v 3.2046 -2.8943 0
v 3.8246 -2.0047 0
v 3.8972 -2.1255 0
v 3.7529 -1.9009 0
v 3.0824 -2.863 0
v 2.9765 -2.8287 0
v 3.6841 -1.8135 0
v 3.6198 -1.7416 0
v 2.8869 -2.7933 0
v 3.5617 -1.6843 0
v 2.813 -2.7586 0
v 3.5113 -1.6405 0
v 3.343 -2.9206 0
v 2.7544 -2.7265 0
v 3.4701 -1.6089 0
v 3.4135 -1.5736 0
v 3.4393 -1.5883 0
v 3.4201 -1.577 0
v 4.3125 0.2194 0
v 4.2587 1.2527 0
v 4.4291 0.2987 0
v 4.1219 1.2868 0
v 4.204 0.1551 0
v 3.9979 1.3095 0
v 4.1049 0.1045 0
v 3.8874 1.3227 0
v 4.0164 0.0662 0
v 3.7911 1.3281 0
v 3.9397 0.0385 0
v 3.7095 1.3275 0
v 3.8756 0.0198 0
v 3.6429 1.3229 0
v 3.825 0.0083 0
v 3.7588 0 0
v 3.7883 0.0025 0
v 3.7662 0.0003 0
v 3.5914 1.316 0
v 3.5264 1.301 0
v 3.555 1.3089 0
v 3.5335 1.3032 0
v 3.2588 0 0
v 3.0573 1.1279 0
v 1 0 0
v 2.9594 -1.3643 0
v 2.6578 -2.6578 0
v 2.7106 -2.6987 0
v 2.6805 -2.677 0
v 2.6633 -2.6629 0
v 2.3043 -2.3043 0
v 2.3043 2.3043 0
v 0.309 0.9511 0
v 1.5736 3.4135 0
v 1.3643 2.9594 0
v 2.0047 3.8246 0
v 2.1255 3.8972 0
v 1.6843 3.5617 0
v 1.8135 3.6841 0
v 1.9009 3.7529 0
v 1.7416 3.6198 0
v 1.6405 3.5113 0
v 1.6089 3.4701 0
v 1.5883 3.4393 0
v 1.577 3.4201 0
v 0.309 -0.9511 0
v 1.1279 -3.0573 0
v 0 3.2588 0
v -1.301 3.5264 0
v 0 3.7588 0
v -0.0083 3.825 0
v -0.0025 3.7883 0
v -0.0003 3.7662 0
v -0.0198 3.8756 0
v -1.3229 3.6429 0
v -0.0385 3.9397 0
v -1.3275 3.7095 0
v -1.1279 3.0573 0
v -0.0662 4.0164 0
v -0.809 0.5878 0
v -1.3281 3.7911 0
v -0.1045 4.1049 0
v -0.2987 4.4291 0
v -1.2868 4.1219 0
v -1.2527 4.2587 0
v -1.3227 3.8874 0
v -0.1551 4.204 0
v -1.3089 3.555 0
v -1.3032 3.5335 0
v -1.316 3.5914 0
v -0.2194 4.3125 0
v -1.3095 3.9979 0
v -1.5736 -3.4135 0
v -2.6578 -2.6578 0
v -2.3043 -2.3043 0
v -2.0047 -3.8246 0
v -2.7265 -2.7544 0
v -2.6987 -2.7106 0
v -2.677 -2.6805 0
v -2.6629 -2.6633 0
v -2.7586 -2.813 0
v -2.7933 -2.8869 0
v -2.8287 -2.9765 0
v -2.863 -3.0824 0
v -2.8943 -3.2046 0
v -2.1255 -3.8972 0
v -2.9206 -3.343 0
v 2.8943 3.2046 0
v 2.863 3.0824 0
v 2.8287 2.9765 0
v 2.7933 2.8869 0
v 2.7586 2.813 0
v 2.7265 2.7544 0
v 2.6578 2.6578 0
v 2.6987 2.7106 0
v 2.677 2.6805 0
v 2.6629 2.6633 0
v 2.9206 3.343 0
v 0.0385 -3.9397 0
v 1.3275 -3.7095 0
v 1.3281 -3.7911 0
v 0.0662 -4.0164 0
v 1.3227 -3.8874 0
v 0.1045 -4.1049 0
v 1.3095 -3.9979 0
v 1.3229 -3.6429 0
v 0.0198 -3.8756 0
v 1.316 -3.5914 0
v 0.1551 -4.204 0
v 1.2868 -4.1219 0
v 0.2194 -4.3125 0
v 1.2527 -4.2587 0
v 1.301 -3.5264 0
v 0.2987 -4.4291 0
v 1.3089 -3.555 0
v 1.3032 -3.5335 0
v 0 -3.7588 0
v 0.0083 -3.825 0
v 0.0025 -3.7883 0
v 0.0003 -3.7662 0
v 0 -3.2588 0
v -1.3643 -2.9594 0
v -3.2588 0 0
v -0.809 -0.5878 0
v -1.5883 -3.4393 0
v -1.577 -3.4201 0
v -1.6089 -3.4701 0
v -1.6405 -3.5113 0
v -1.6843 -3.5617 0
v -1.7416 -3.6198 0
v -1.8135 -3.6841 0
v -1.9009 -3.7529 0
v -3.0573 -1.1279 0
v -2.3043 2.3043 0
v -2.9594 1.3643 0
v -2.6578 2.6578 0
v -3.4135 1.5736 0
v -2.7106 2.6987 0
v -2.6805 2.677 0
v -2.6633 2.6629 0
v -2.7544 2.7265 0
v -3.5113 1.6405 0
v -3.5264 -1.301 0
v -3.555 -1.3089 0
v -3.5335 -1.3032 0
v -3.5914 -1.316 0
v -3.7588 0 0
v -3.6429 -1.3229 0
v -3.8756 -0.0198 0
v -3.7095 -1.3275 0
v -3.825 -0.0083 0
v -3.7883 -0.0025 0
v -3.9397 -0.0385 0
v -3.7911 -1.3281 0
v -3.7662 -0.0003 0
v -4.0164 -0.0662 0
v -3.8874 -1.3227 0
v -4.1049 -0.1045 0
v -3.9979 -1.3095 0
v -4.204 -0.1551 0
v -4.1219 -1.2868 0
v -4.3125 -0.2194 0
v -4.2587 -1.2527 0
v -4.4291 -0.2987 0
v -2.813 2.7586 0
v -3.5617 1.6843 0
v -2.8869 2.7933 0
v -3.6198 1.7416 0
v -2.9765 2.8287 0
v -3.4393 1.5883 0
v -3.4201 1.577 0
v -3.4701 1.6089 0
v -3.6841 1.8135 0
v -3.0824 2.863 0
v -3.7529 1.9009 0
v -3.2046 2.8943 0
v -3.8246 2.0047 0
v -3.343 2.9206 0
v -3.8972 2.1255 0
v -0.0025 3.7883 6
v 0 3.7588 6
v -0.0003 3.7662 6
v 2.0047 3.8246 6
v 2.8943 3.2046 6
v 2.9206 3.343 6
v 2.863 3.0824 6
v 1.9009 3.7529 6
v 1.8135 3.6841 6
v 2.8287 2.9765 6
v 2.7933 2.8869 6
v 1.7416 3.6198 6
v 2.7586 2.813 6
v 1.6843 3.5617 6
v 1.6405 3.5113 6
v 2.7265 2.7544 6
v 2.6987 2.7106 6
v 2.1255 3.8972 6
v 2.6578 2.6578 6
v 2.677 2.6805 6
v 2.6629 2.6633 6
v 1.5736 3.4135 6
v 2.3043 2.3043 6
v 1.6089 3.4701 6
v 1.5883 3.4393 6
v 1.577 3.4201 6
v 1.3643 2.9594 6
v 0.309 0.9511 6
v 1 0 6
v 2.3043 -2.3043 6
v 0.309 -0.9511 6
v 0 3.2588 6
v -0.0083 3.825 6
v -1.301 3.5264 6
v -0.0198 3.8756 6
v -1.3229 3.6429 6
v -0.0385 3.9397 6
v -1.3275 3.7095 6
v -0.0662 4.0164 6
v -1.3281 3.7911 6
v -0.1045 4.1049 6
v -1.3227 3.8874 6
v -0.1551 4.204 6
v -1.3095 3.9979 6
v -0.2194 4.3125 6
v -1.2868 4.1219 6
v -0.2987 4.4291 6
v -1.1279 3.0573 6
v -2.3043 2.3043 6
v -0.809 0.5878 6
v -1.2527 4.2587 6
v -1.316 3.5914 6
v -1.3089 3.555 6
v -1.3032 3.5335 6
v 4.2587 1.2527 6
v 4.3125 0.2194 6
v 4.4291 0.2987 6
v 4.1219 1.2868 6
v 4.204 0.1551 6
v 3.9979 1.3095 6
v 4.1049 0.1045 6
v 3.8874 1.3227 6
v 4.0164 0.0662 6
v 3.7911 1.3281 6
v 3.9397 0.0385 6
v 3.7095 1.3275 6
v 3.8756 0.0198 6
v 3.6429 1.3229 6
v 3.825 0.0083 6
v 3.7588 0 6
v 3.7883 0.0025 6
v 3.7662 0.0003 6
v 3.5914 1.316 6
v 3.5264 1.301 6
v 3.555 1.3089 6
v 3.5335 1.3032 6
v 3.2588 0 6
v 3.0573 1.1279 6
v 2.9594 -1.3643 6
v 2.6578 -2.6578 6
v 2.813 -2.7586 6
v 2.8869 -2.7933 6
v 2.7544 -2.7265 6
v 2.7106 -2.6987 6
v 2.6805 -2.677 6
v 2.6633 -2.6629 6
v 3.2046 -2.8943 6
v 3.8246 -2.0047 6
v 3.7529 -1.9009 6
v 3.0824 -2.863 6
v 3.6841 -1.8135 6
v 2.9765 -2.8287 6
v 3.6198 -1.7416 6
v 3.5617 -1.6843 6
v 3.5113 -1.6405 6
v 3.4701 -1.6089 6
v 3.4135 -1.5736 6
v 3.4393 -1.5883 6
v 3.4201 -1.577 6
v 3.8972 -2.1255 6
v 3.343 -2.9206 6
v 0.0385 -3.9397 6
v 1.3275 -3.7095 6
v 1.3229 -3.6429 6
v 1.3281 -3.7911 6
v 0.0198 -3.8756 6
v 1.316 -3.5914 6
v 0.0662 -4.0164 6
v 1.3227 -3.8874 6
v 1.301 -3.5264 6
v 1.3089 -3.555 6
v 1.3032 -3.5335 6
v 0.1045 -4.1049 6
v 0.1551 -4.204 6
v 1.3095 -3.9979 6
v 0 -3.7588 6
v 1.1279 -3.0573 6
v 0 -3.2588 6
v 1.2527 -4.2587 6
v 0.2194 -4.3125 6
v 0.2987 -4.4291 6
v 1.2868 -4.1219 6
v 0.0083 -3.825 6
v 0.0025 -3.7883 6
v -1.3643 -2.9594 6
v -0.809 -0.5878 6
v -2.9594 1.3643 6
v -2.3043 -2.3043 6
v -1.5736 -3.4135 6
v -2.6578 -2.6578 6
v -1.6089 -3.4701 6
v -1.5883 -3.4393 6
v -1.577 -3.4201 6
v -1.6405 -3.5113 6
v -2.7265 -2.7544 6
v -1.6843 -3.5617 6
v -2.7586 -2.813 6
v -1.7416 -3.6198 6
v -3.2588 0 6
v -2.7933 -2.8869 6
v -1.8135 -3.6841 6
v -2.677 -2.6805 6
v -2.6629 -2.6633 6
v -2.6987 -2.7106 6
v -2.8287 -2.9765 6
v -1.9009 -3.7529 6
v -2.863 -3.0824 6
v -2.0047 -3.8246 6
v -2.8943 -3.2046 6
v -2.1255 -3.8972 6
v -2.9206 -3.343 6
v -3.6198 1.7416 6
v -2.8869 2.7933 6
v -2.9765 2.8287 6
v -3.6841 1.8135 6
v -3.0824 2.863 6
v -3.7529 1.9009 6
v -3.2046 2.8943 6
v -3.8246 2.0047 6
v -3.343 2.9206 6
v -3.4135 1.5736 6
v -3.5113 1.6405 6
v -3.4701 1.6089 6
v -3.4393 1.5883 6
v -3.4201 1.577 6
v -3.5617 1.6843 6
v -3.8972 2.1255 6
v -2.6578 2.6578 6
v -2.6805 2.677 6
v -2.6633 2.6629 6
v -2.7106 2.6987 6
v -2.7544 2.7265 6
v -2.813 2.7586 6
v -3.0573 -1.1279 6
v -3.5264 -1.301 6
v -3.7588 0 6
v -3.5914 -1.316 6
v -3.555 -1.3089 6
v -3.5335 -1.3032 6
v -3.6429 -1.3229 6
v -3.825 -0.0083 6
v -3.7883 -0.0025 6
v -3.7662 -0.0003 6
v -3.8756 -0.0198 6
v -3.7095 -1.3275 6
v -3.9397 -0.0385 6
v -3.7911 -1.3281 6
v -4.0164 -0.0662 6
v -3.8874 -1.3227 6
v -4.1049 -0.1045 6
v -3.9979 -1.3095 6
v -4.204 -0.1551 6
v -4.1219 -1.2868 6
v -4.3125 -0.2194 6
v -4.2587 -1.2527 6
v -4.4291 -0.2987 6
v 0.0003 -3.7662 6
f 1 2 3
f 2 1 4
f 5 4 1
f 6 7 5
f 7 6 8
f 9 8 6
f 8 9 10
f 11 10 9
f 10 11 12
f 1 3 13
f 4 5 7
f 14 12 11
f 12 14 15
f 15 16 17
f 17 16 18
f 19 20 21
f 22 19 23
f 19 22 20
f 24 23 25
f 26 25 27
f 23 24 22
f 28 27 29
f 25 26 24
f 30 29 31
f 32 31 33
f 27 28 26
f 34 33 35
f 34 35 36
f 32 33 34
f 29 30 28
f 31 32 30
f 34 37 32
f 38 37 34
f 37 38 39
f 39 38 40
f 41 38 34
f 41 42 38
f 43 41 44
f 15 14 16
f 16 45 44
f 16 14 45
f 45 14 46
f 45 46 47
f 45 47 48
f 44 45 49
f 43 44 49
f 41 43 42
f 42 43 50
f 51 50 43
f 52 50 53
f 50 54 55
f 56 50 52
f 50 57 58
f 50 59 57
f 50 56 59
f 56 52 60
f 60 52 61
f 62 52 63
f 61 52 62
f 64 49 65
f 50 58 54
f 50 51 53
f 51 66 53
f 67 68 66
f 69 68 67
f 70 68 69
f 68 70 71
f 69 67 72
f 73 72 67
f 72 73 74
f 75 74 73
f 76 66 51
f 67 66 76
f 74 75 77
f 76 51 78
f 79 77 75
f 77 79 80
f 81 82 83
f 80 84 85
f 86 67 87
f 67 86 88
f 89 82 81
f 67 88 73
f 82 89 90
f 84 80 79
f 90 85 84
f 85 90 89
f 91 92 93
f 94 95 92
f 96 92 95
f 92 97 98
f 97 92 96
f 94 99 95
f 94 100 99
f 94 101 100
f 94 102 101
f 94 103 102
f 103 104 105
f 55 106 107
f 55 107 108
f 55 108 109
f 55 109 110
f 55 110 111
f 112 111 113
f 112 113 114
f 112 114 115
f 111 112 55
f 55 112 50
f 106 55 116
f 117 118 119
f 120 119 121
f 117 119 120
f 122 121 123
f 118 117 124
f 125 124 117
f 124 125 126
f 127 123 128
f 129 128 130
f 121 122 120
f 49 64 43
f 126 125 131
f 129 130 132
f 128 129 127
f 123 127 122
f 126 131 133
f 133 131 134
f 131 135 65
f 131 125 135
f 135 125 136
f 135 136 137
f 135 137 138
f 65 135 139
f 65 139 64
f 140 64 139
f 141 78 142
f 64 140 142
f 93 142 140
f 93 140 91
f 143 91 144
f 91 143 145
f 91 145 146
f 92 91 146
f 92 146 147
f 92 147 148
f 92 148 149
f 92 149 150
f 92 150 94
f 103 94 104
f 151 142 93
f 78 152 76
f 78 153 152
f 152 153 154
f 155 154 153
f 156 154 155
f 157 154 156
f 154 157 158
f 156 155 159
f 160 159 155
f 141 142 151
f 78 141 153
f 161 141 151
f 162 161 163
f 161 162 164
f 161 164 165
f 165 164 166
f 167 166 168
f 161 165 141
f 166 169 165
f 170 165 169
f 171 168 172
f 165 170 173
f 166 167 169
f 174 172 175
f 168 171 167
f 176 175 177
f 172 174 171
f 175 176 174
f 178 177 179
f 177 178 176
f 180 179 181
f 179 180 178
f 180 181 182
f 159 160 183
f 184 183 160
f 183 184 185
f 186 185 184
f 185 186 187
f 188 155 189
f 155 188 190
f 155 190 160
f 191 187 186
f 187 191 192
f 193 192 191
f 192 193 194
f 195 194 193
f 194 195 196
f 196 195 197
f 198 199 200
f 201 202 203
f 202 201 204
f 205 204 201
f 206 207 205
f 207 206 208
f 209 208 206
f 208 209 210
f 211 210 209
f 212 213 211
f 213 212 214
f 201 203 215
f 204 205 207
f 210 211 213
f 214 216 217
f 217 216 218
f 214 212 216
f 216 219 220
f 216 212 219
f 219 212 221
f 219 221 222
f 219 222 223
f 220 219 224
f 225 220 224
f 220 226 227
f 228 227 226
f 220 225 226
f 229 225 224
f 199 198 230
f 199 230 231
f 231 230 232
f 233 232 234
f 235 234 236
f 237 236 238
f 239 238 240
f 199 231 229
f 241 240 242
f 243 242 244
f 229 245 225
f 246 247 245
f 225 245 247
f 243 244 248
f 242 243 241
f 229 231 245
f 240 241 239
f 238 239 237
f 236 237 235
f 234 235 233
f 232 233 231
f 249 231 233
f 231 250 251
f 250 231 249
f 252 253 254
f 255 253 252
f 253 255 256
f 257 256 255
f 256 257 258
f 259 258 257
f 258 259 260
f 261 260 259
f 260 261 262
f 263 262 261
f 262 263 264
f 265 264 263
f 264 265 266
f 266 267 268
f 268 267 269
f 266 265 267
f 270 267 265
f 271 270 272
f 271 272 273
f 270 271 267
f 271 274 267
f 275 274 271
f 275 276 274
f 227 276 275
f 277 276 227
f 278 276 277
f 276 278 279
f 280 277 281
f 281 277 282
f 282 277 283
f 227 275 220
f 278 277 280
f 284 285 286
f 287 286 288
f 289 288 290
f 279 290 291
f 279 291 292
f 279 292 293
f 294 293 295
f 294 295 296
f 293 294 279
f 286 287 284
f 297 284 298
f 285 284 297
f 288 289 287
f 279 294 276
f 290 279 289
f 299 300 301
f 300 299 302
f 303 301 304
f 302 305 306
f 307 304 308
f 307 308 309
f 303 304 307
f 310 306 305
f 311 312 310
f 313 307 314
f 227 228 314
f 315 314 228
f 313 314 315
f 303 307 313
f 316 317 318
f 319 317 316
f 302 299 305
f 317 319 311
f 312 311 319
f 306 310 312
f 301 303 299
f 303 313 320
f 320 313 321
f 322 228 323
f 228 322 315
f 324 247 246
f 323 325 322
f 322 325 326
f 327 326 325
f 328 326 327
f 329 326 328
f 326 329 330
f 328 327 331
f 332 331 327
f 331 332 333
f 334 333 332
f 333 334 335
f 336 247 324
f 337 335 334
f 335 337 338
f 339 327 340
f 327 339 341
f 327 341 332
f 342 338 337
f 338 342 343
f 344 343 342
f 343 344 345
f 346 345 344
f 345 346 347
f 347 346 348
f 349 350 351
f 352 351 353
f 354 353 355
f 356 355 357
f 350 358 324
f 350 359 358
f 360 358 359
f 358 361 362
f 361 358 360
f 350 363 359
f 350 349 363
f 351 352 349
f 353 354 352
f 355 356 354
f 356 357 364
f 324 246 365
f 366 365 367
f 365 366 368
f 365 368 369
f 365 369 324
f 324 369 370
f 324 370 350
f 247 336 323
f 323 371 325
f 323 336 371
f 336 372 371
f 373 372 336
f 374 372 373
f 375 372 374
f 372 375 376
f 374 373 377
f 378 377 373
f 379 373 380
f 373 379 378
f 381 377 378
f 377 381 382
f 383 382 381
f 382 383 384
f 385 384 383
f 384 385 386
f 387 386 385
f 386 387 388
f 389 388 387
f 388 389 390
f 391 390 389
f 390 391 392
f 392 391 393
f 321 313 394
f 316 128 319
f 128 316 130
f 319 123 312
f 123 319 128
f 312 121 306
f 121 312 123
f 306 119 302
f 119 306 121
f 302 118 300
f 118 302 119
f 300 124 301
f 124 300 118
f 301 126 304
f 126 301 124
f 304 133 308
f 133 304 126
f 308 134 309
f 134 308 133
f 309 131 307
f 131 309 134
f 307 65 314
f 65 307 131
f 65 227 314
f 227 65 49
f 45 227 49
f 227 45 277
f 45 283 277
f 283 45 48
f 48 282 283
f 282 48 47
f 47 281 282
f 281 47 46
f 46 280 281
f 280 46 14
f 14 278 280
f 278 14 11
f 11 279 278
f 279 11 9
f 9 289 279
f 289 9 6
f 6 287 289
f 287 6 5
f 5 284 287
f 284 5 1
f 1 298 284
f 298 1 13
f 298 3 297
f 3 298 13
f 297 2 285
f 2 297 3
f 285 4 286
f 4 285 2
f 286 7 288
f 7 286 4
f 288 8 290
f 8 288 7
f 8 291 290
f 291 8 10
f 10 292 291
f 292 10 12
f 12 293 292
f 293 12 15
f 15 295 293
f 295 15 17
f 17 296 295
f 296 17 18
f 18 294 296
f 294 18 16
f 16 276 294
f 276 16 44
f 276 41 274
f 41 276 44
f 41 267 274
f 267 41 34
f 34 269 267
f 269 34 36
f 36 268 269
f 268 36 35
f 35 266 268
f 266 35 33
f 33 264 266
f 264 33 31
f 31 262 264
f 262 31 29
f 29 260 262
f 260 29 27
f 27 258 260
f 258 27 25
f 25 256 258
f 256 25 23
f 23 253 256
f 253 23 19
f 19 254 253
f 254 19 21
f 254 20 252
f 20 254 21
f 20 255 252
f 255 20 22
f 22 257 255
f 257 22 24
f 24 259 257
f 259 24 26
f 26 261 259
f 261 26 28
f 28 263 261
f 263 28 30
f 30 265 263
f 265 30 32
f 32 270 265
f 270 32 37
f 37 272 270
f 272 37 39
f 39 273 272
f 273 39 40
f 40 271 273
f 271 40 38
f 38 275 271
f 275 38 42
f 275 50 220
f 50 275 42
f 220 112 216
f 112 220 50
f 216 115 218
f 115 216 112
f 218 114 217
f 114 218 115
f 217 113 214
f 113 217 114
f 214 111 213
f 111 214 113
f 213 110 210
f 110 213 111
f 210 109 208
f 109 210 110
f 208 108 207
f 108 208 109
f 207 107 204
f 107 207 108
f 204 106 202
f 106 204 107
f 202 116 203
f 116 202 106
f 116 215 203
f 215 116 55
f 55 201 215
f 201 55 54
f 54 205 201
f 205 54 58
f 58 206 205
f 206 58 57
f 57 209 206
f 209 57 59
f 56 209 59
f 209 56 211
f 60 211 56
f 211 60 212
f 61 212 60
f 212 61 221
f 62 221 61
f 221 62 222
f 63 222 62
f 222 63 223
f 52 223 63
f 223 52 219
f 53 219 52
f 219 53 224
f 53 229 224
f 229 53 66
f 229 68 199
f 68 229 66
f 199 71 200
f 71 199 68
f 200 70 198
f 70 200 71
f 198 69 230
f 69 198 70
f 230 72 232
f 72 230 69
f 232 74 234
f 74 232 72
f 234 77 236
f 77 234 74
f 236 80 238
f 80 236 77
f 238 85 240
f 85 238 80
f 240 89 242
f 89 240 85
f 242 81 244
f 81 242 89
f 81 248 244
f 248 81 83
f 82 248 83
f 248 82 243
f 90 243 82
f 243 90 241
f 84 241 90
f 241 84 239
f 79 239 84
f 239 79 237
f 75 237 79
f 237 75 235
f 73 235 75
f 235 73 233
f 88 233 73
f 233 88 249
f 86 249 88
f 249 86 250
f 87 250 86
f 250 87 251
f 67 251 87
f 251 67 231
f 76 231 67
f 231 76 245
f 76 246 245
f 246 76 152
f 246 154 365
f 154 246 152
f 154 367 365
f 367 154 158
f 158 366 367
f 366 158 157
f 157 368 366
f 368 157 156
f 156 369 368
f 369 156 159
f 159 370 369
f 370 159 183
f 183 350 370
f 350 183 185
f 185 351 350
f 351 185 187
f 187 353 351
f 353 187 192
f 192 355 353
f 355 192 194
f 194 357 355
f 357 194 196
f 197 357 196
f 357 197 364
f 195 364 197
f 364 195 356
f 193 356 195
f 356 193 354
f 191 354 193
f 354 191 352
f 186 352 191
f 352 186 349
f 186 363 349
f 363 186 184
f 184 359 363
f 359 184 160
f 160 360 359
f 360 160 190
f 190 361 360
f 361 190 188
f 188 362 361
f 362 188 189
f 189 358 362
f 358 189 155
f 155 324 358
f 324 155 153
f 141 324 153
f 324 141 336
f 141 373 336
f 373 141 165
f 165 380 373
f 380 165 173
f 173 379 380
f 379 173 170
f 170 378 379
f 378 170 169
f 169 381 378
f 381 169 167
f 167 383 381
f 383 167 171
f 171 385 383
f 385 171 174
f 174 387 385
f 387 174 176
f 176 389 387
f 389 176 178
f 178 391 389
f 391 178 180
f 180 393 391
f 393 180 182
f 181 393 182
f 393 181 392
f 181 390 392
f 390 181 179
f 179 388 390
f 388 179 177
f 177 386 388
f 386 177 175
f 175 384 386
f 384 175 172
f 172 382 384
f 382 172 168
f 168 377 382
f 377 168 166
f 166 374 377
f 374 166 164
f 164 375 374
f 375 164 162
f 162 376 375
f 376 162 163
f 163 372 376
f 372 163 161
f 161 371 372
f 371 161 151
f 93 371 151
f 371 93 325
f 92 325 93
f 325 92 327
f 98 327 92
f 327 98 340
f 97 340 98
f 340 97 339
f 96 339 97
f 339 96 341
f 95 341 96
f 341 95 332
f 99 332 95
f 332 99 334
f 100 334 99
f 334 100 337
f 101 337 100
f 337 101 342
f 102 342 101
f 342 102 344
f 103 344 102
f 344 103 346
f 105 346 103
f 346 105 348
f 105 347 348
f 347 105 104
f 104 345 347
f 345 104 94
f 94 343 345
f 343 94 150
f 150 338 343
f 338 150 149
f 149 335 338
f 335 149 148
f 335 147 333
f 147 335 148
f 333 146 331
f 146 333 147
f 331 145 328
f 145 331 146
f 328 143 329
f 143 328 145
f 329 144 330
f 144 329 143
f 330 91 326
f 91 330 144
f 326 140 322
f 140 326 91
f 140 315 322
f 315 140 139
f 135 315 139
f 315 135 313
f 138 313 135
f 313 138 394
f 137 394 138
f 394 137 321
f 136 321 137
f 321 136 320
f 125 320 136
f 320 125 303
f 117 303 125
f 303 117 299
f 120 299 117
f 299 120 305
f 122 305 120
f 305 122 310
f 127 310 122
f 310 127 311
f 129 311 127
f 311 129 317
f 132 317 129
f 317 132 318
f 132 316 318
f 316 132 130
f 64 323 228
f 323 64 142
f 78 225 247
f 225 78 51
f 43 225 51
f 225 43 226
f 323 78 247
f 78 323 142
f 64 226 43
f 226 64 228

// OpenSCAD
difference(){
       linear_extrude(height = 6.0) { polygon( points= [[3.2587704831436337,0.0],[3.7587704831436337,0.0],[3.7661826775218383,3.106652633452797e-4],[3.788331483760405,2.482379522165296e-3],[3.824954148555375,8.361497512954905e-3],[3.875614671157227,1.9765072451087693e-2],[3.939706674356992,3.8466422304543946e-2],[4.0164574016259635,6.61809552291836e-2],[4.104932818303717,0.10455233842683846],[4.204043788606136,0.1551390928787902],[4.31255329424558,0.21940169416311134],[4.429084654649506,0.2986902568959486],[4.25871064175394,1.252753135070131],[4.121938805066724,1.286807486143582],[3.9978937445738914,1.3095411111355153],[3.8873997523632795,1.3226971685096065],[3.7911118927657146,1.3280740169287988],[3.7095125528420625,1.3275108157469406],[3.6429091345634714,1.3228729246198043],[3.5914328993873603,1.3160371888323426],[3.555038969561142,1.308877197432997],[3.533507484099017,1.3032486013016489],[3.526445901006527,1.300974577855421],[3.057350233045285,1.1279160493166744],[2.304298706961425,2.304298706961425],[2.657852097554699,2.6578520975546986],[2.66287363694861,2.6633129839773906],[2.676999574155876,2.6805101889430794],[2.698738544578838,2.710563487763407],[2.7264973984805394,2.7544494320021538],[2.758593437264202,2.812993173383259],[2.793267262808661,2.886861267264578],[2.828696164647236,2.9765554996282924],[2.8630079667268618,3.0824077759303057],[2.8942952528428814,3.204576104335987],[2.920629887626467,3.3430416998774204],[2.1255329369347287,3.8971934108563215],[2.0047405811649144,3.824561180232396],[1.9009523773249888,3.7529231771779665],[1.8135185887695924,3.684094863388369],[1.7416307843235932,3.6198110708996154],[1.6843295810980967,3.5617133809243904],[1.6405133366495037,3.5113381679429922],[1.6089477368162357,3.470105377850296],[1.5882762207138044,3.4393081048044354],[1.5770311798275527,3.4201030269321104],[1.5736458639363455,3.4135017562420935],[1.3643159951676316,2.9594301693295533],[1.9954214206688624e-16,3.2587704831436337],[2.3015831204557005e-16,3.7587704831436337],[-3.1066526334504906e-4,3.7661826775218383],[-2.482379522165064e-3,3.788331483760405],[-8.36149751295467e-3,3.824954148555375],[-1.9765072451087457e-2,3.875614671157227],[-3.84664223045437e-2,3.939706674356992],[-6.618095522918335e-2,4.0164574016259635],[-0.10455233842683821,4.104932818303717],[-0.15513909287878996,4.204043788606136],[-0.21940169416311106,4.31255329424558],[-0.2986902568959483,4.429084654649506],[-1.2527531350701309,4.25871064175394],[-1.2868074861435819,4.121938805066724],[-1.309541111135515,3.9978937445738914],[-1.3226971685096063,3.8873997523632795],[-1.3280740169287986,3.7911118927657146],[-1.3275108157469404,3.7095125528420625],[-1.322872924619804,3.6429091345634714],[-1.3160371888323423,3.5914328993873603],[-1.3088771974329967,3.555038969561142],[-1.3032486013016487,3.533507484099017],[-1.3009745778554207,3.526445901006527],[-1.1279160493166742,3.057350233045285],[-2.304298706961425,2.304298706961425],[-2.6578520975546986,2.657852097554699],[-2.6633129839773906,2.66287363694861],[-2.6805101889430794,2.676999574155876],[-2.710563487763407,2.698738544578838],[-2.7544494320021538,2.7264973984805394],[-2.812993173383259,2.758593437264202],[-2.886861267264578,2.793267262808661],[-2.9765554996282924,2.828696164647236],[-3.0824077759303057,2.8630079667268618],[-3.204576104335987,2.8942952528428814],[-3.3430416998774204,2.920629887626467],[-3.8971934108563215,2.1255329369347287],[-3.824561180232396,2.0047405811649144],[-3.7529231771779665,1.9009523773249888],[-3.684094863388369,1.8135185887695924],[-3.6198110708996154,1.7416307843235932],[-3.5617133809243904,1.6843295810980967],[-3.5113381679429922,1.6405133366495037],[-3.470105377850296,1.6089477368162357],[-3.4393081048044354,1.5882762207138044],[-3.4201030269321104,1.5770311798275527],[-3.4135017562420935,1.5736458639363455],[-2.9594301693295533,1.3643159951676316],[-3.2587704831436337,3.990842841337725e-16],[-3.7587704831436337,4.603166240911401e-16],[-3.7661826775218383,-3.1066526334481845e-4],[-3.788331483760405,-2.482379522164832e-3],[-3.824954148555375,-8.361497512954437e-3],[-3.875614671157227,-1.9765072451087218e-2],[-3.939706674356992,-3.846642230454346e-2],[-4.0164574016259635,-6.618095522918312e-2],[-4.104932818303717,-0.10455233842683796],[-4.204043788606136,-0.1551390928787897],[-4.31255329424558,-0.2194016941631108],[-4.429084654649506,-0.298690256895948],[-4.25871064175394,-1.2527531350701306],[-4.121938805066724,-1.2868074861435816],[-3.9978937445738914,-1.3095411111355149],[-3.8873997523632795,-1.322697168509606],[-3.7911118927657146,-1.3280740169287983],[-3.7095125528420625,-1.3275108157469402],[-3.6429091345634714,-1.3228729246198039],[-3.5914328993873603,-1.316037188832342],[-3.555038969561142,-1.3088771974329965],[-3.533507484099017,-1.3032486013016484],[-3.526445901006527,-1.3009745778554205],[-3.057350233045285,-1.127916049316674],[-2.3042987069614256,-2.304298706961425],[-2.6578520975546995,-2.6578520975546986],[-2.6628736369486106,-2.6633129839773906],[-2.6769995741558765,-2.6805101889430794],[-2.6987385445788385,-2.710563487763407],[-2.72649739848054,-2.7544494320021538],[-2.7585934372642025,-2.812993173383259],[-2.7932672628086612,-2.886861267264578],[-2.8286961646472366,-2.9765554996282924],[-2.863007966726862,-3.0824077759303057],[-2.894295252842882,-3.204576104335987],[-2.9206298876264674,-3.3430416998774204],[-2.125532936934729,-3.8971934108563215],[-2.0047405811649144,-3.824561180232396],[-1.9009523773249892,-3.7529231771779665],[-1.8135185887695928,-3.684094863388369],[-1.7416307843235936,-3.6198110708996154],[-1.6843295810980972,-3.561713380924391],[-1.6405133366495042,-3.5113381679429922],[-1.6089477368162362,-3.470105377850296],[-1.5882762207138048,-3.4393081048044354],[-1.5770311798275531,-3.420103026932111],[-1.573645863936346,-3.4135017562420935],[-1.364315995167632,-2.9594301693295533],[-5.986264262006587e-16,-3.2587704831436337],[-6.904749361367102e-16,-3.7587704831436337],[3.1066526334458784e-4,-3.7661826775218383],[2.4823795221646e-3,-3.788331483760405],[8.361497512954202e-3,-3.824954148555375],[1.9765072451086982e-2,-3.875614671157227],[3.8466422304543224e-2,-3.939706674356992],[6.618095522918287e-2,-4.0164574016259635],[0.10455233842683771,-4.104932818303717],[0.15513909287878944,-4.204043788606136],[0.21940169416311053,-4.31255329424558],[0.29869025689594775,-4.429084654649506],[1.2527531350701302,-4.25871064175394],[1.2868074861435814,-4.121938805066724],[1.3095411111355146,-3.997893744573892],[1.3226971685096058,-3.88739975236328],[1.3280740169287981,-3.791111892765715],[1.32751081574694,-3.709512552842063],[1.3228729246198037,-3.642909134563472],[1.3160371888323419,-3.5914328993873608],[1.3088771974329962,-3.5550389695611426],[1.3032486013016482,-3.5335074840990175],[1.3009745778554203,-3.5264459010065274],[1.1279160493166738,-3.057350233045285],[2.3042987069614247,-2.3042987069614256],[2.657852097554698,-2.6578520975546995],[2.66331298397739,-2.6628736369486106],[2.680510188943079,-2.6769995741558765],[2.7105634877634066,-2.6987385445788385],[2.7544494320021533,-2.72649739848054],[2.8129931733832585,-2.7585934372642025],[2.8868612672645777,-2.7932672628086612],[2.976555499628292,-2.8286961646472366],[3.0824077759303052,-2.863007966726862],[3.2045761043359864,-2.894295252842882],[3.34304169987742,-2.9206298876264674],[3.8971934108563207,-2.1255329369347296],[3.8245611802323953,-2.004740581164915],[3.7529231771779665,-1.9009523773249895],[3.6840948633883683,-1.8135185887695928],[3.619811070899615,-1.7416307843235939],[3.5617133809243904,-1.6843295810980972],[3.511338167942992,-1.6405133366495042],[3.470105377850296,-1.6089477368162366],[3.4393081048044354,-1.588276220713805],[3.42010302693211,-1.5770311798275534],[3.4135017562420935,-1.5736458639363462],[2.959430169329553,-1.3643159951676322]] );}
   cylinder(20,1,center=true);
}
